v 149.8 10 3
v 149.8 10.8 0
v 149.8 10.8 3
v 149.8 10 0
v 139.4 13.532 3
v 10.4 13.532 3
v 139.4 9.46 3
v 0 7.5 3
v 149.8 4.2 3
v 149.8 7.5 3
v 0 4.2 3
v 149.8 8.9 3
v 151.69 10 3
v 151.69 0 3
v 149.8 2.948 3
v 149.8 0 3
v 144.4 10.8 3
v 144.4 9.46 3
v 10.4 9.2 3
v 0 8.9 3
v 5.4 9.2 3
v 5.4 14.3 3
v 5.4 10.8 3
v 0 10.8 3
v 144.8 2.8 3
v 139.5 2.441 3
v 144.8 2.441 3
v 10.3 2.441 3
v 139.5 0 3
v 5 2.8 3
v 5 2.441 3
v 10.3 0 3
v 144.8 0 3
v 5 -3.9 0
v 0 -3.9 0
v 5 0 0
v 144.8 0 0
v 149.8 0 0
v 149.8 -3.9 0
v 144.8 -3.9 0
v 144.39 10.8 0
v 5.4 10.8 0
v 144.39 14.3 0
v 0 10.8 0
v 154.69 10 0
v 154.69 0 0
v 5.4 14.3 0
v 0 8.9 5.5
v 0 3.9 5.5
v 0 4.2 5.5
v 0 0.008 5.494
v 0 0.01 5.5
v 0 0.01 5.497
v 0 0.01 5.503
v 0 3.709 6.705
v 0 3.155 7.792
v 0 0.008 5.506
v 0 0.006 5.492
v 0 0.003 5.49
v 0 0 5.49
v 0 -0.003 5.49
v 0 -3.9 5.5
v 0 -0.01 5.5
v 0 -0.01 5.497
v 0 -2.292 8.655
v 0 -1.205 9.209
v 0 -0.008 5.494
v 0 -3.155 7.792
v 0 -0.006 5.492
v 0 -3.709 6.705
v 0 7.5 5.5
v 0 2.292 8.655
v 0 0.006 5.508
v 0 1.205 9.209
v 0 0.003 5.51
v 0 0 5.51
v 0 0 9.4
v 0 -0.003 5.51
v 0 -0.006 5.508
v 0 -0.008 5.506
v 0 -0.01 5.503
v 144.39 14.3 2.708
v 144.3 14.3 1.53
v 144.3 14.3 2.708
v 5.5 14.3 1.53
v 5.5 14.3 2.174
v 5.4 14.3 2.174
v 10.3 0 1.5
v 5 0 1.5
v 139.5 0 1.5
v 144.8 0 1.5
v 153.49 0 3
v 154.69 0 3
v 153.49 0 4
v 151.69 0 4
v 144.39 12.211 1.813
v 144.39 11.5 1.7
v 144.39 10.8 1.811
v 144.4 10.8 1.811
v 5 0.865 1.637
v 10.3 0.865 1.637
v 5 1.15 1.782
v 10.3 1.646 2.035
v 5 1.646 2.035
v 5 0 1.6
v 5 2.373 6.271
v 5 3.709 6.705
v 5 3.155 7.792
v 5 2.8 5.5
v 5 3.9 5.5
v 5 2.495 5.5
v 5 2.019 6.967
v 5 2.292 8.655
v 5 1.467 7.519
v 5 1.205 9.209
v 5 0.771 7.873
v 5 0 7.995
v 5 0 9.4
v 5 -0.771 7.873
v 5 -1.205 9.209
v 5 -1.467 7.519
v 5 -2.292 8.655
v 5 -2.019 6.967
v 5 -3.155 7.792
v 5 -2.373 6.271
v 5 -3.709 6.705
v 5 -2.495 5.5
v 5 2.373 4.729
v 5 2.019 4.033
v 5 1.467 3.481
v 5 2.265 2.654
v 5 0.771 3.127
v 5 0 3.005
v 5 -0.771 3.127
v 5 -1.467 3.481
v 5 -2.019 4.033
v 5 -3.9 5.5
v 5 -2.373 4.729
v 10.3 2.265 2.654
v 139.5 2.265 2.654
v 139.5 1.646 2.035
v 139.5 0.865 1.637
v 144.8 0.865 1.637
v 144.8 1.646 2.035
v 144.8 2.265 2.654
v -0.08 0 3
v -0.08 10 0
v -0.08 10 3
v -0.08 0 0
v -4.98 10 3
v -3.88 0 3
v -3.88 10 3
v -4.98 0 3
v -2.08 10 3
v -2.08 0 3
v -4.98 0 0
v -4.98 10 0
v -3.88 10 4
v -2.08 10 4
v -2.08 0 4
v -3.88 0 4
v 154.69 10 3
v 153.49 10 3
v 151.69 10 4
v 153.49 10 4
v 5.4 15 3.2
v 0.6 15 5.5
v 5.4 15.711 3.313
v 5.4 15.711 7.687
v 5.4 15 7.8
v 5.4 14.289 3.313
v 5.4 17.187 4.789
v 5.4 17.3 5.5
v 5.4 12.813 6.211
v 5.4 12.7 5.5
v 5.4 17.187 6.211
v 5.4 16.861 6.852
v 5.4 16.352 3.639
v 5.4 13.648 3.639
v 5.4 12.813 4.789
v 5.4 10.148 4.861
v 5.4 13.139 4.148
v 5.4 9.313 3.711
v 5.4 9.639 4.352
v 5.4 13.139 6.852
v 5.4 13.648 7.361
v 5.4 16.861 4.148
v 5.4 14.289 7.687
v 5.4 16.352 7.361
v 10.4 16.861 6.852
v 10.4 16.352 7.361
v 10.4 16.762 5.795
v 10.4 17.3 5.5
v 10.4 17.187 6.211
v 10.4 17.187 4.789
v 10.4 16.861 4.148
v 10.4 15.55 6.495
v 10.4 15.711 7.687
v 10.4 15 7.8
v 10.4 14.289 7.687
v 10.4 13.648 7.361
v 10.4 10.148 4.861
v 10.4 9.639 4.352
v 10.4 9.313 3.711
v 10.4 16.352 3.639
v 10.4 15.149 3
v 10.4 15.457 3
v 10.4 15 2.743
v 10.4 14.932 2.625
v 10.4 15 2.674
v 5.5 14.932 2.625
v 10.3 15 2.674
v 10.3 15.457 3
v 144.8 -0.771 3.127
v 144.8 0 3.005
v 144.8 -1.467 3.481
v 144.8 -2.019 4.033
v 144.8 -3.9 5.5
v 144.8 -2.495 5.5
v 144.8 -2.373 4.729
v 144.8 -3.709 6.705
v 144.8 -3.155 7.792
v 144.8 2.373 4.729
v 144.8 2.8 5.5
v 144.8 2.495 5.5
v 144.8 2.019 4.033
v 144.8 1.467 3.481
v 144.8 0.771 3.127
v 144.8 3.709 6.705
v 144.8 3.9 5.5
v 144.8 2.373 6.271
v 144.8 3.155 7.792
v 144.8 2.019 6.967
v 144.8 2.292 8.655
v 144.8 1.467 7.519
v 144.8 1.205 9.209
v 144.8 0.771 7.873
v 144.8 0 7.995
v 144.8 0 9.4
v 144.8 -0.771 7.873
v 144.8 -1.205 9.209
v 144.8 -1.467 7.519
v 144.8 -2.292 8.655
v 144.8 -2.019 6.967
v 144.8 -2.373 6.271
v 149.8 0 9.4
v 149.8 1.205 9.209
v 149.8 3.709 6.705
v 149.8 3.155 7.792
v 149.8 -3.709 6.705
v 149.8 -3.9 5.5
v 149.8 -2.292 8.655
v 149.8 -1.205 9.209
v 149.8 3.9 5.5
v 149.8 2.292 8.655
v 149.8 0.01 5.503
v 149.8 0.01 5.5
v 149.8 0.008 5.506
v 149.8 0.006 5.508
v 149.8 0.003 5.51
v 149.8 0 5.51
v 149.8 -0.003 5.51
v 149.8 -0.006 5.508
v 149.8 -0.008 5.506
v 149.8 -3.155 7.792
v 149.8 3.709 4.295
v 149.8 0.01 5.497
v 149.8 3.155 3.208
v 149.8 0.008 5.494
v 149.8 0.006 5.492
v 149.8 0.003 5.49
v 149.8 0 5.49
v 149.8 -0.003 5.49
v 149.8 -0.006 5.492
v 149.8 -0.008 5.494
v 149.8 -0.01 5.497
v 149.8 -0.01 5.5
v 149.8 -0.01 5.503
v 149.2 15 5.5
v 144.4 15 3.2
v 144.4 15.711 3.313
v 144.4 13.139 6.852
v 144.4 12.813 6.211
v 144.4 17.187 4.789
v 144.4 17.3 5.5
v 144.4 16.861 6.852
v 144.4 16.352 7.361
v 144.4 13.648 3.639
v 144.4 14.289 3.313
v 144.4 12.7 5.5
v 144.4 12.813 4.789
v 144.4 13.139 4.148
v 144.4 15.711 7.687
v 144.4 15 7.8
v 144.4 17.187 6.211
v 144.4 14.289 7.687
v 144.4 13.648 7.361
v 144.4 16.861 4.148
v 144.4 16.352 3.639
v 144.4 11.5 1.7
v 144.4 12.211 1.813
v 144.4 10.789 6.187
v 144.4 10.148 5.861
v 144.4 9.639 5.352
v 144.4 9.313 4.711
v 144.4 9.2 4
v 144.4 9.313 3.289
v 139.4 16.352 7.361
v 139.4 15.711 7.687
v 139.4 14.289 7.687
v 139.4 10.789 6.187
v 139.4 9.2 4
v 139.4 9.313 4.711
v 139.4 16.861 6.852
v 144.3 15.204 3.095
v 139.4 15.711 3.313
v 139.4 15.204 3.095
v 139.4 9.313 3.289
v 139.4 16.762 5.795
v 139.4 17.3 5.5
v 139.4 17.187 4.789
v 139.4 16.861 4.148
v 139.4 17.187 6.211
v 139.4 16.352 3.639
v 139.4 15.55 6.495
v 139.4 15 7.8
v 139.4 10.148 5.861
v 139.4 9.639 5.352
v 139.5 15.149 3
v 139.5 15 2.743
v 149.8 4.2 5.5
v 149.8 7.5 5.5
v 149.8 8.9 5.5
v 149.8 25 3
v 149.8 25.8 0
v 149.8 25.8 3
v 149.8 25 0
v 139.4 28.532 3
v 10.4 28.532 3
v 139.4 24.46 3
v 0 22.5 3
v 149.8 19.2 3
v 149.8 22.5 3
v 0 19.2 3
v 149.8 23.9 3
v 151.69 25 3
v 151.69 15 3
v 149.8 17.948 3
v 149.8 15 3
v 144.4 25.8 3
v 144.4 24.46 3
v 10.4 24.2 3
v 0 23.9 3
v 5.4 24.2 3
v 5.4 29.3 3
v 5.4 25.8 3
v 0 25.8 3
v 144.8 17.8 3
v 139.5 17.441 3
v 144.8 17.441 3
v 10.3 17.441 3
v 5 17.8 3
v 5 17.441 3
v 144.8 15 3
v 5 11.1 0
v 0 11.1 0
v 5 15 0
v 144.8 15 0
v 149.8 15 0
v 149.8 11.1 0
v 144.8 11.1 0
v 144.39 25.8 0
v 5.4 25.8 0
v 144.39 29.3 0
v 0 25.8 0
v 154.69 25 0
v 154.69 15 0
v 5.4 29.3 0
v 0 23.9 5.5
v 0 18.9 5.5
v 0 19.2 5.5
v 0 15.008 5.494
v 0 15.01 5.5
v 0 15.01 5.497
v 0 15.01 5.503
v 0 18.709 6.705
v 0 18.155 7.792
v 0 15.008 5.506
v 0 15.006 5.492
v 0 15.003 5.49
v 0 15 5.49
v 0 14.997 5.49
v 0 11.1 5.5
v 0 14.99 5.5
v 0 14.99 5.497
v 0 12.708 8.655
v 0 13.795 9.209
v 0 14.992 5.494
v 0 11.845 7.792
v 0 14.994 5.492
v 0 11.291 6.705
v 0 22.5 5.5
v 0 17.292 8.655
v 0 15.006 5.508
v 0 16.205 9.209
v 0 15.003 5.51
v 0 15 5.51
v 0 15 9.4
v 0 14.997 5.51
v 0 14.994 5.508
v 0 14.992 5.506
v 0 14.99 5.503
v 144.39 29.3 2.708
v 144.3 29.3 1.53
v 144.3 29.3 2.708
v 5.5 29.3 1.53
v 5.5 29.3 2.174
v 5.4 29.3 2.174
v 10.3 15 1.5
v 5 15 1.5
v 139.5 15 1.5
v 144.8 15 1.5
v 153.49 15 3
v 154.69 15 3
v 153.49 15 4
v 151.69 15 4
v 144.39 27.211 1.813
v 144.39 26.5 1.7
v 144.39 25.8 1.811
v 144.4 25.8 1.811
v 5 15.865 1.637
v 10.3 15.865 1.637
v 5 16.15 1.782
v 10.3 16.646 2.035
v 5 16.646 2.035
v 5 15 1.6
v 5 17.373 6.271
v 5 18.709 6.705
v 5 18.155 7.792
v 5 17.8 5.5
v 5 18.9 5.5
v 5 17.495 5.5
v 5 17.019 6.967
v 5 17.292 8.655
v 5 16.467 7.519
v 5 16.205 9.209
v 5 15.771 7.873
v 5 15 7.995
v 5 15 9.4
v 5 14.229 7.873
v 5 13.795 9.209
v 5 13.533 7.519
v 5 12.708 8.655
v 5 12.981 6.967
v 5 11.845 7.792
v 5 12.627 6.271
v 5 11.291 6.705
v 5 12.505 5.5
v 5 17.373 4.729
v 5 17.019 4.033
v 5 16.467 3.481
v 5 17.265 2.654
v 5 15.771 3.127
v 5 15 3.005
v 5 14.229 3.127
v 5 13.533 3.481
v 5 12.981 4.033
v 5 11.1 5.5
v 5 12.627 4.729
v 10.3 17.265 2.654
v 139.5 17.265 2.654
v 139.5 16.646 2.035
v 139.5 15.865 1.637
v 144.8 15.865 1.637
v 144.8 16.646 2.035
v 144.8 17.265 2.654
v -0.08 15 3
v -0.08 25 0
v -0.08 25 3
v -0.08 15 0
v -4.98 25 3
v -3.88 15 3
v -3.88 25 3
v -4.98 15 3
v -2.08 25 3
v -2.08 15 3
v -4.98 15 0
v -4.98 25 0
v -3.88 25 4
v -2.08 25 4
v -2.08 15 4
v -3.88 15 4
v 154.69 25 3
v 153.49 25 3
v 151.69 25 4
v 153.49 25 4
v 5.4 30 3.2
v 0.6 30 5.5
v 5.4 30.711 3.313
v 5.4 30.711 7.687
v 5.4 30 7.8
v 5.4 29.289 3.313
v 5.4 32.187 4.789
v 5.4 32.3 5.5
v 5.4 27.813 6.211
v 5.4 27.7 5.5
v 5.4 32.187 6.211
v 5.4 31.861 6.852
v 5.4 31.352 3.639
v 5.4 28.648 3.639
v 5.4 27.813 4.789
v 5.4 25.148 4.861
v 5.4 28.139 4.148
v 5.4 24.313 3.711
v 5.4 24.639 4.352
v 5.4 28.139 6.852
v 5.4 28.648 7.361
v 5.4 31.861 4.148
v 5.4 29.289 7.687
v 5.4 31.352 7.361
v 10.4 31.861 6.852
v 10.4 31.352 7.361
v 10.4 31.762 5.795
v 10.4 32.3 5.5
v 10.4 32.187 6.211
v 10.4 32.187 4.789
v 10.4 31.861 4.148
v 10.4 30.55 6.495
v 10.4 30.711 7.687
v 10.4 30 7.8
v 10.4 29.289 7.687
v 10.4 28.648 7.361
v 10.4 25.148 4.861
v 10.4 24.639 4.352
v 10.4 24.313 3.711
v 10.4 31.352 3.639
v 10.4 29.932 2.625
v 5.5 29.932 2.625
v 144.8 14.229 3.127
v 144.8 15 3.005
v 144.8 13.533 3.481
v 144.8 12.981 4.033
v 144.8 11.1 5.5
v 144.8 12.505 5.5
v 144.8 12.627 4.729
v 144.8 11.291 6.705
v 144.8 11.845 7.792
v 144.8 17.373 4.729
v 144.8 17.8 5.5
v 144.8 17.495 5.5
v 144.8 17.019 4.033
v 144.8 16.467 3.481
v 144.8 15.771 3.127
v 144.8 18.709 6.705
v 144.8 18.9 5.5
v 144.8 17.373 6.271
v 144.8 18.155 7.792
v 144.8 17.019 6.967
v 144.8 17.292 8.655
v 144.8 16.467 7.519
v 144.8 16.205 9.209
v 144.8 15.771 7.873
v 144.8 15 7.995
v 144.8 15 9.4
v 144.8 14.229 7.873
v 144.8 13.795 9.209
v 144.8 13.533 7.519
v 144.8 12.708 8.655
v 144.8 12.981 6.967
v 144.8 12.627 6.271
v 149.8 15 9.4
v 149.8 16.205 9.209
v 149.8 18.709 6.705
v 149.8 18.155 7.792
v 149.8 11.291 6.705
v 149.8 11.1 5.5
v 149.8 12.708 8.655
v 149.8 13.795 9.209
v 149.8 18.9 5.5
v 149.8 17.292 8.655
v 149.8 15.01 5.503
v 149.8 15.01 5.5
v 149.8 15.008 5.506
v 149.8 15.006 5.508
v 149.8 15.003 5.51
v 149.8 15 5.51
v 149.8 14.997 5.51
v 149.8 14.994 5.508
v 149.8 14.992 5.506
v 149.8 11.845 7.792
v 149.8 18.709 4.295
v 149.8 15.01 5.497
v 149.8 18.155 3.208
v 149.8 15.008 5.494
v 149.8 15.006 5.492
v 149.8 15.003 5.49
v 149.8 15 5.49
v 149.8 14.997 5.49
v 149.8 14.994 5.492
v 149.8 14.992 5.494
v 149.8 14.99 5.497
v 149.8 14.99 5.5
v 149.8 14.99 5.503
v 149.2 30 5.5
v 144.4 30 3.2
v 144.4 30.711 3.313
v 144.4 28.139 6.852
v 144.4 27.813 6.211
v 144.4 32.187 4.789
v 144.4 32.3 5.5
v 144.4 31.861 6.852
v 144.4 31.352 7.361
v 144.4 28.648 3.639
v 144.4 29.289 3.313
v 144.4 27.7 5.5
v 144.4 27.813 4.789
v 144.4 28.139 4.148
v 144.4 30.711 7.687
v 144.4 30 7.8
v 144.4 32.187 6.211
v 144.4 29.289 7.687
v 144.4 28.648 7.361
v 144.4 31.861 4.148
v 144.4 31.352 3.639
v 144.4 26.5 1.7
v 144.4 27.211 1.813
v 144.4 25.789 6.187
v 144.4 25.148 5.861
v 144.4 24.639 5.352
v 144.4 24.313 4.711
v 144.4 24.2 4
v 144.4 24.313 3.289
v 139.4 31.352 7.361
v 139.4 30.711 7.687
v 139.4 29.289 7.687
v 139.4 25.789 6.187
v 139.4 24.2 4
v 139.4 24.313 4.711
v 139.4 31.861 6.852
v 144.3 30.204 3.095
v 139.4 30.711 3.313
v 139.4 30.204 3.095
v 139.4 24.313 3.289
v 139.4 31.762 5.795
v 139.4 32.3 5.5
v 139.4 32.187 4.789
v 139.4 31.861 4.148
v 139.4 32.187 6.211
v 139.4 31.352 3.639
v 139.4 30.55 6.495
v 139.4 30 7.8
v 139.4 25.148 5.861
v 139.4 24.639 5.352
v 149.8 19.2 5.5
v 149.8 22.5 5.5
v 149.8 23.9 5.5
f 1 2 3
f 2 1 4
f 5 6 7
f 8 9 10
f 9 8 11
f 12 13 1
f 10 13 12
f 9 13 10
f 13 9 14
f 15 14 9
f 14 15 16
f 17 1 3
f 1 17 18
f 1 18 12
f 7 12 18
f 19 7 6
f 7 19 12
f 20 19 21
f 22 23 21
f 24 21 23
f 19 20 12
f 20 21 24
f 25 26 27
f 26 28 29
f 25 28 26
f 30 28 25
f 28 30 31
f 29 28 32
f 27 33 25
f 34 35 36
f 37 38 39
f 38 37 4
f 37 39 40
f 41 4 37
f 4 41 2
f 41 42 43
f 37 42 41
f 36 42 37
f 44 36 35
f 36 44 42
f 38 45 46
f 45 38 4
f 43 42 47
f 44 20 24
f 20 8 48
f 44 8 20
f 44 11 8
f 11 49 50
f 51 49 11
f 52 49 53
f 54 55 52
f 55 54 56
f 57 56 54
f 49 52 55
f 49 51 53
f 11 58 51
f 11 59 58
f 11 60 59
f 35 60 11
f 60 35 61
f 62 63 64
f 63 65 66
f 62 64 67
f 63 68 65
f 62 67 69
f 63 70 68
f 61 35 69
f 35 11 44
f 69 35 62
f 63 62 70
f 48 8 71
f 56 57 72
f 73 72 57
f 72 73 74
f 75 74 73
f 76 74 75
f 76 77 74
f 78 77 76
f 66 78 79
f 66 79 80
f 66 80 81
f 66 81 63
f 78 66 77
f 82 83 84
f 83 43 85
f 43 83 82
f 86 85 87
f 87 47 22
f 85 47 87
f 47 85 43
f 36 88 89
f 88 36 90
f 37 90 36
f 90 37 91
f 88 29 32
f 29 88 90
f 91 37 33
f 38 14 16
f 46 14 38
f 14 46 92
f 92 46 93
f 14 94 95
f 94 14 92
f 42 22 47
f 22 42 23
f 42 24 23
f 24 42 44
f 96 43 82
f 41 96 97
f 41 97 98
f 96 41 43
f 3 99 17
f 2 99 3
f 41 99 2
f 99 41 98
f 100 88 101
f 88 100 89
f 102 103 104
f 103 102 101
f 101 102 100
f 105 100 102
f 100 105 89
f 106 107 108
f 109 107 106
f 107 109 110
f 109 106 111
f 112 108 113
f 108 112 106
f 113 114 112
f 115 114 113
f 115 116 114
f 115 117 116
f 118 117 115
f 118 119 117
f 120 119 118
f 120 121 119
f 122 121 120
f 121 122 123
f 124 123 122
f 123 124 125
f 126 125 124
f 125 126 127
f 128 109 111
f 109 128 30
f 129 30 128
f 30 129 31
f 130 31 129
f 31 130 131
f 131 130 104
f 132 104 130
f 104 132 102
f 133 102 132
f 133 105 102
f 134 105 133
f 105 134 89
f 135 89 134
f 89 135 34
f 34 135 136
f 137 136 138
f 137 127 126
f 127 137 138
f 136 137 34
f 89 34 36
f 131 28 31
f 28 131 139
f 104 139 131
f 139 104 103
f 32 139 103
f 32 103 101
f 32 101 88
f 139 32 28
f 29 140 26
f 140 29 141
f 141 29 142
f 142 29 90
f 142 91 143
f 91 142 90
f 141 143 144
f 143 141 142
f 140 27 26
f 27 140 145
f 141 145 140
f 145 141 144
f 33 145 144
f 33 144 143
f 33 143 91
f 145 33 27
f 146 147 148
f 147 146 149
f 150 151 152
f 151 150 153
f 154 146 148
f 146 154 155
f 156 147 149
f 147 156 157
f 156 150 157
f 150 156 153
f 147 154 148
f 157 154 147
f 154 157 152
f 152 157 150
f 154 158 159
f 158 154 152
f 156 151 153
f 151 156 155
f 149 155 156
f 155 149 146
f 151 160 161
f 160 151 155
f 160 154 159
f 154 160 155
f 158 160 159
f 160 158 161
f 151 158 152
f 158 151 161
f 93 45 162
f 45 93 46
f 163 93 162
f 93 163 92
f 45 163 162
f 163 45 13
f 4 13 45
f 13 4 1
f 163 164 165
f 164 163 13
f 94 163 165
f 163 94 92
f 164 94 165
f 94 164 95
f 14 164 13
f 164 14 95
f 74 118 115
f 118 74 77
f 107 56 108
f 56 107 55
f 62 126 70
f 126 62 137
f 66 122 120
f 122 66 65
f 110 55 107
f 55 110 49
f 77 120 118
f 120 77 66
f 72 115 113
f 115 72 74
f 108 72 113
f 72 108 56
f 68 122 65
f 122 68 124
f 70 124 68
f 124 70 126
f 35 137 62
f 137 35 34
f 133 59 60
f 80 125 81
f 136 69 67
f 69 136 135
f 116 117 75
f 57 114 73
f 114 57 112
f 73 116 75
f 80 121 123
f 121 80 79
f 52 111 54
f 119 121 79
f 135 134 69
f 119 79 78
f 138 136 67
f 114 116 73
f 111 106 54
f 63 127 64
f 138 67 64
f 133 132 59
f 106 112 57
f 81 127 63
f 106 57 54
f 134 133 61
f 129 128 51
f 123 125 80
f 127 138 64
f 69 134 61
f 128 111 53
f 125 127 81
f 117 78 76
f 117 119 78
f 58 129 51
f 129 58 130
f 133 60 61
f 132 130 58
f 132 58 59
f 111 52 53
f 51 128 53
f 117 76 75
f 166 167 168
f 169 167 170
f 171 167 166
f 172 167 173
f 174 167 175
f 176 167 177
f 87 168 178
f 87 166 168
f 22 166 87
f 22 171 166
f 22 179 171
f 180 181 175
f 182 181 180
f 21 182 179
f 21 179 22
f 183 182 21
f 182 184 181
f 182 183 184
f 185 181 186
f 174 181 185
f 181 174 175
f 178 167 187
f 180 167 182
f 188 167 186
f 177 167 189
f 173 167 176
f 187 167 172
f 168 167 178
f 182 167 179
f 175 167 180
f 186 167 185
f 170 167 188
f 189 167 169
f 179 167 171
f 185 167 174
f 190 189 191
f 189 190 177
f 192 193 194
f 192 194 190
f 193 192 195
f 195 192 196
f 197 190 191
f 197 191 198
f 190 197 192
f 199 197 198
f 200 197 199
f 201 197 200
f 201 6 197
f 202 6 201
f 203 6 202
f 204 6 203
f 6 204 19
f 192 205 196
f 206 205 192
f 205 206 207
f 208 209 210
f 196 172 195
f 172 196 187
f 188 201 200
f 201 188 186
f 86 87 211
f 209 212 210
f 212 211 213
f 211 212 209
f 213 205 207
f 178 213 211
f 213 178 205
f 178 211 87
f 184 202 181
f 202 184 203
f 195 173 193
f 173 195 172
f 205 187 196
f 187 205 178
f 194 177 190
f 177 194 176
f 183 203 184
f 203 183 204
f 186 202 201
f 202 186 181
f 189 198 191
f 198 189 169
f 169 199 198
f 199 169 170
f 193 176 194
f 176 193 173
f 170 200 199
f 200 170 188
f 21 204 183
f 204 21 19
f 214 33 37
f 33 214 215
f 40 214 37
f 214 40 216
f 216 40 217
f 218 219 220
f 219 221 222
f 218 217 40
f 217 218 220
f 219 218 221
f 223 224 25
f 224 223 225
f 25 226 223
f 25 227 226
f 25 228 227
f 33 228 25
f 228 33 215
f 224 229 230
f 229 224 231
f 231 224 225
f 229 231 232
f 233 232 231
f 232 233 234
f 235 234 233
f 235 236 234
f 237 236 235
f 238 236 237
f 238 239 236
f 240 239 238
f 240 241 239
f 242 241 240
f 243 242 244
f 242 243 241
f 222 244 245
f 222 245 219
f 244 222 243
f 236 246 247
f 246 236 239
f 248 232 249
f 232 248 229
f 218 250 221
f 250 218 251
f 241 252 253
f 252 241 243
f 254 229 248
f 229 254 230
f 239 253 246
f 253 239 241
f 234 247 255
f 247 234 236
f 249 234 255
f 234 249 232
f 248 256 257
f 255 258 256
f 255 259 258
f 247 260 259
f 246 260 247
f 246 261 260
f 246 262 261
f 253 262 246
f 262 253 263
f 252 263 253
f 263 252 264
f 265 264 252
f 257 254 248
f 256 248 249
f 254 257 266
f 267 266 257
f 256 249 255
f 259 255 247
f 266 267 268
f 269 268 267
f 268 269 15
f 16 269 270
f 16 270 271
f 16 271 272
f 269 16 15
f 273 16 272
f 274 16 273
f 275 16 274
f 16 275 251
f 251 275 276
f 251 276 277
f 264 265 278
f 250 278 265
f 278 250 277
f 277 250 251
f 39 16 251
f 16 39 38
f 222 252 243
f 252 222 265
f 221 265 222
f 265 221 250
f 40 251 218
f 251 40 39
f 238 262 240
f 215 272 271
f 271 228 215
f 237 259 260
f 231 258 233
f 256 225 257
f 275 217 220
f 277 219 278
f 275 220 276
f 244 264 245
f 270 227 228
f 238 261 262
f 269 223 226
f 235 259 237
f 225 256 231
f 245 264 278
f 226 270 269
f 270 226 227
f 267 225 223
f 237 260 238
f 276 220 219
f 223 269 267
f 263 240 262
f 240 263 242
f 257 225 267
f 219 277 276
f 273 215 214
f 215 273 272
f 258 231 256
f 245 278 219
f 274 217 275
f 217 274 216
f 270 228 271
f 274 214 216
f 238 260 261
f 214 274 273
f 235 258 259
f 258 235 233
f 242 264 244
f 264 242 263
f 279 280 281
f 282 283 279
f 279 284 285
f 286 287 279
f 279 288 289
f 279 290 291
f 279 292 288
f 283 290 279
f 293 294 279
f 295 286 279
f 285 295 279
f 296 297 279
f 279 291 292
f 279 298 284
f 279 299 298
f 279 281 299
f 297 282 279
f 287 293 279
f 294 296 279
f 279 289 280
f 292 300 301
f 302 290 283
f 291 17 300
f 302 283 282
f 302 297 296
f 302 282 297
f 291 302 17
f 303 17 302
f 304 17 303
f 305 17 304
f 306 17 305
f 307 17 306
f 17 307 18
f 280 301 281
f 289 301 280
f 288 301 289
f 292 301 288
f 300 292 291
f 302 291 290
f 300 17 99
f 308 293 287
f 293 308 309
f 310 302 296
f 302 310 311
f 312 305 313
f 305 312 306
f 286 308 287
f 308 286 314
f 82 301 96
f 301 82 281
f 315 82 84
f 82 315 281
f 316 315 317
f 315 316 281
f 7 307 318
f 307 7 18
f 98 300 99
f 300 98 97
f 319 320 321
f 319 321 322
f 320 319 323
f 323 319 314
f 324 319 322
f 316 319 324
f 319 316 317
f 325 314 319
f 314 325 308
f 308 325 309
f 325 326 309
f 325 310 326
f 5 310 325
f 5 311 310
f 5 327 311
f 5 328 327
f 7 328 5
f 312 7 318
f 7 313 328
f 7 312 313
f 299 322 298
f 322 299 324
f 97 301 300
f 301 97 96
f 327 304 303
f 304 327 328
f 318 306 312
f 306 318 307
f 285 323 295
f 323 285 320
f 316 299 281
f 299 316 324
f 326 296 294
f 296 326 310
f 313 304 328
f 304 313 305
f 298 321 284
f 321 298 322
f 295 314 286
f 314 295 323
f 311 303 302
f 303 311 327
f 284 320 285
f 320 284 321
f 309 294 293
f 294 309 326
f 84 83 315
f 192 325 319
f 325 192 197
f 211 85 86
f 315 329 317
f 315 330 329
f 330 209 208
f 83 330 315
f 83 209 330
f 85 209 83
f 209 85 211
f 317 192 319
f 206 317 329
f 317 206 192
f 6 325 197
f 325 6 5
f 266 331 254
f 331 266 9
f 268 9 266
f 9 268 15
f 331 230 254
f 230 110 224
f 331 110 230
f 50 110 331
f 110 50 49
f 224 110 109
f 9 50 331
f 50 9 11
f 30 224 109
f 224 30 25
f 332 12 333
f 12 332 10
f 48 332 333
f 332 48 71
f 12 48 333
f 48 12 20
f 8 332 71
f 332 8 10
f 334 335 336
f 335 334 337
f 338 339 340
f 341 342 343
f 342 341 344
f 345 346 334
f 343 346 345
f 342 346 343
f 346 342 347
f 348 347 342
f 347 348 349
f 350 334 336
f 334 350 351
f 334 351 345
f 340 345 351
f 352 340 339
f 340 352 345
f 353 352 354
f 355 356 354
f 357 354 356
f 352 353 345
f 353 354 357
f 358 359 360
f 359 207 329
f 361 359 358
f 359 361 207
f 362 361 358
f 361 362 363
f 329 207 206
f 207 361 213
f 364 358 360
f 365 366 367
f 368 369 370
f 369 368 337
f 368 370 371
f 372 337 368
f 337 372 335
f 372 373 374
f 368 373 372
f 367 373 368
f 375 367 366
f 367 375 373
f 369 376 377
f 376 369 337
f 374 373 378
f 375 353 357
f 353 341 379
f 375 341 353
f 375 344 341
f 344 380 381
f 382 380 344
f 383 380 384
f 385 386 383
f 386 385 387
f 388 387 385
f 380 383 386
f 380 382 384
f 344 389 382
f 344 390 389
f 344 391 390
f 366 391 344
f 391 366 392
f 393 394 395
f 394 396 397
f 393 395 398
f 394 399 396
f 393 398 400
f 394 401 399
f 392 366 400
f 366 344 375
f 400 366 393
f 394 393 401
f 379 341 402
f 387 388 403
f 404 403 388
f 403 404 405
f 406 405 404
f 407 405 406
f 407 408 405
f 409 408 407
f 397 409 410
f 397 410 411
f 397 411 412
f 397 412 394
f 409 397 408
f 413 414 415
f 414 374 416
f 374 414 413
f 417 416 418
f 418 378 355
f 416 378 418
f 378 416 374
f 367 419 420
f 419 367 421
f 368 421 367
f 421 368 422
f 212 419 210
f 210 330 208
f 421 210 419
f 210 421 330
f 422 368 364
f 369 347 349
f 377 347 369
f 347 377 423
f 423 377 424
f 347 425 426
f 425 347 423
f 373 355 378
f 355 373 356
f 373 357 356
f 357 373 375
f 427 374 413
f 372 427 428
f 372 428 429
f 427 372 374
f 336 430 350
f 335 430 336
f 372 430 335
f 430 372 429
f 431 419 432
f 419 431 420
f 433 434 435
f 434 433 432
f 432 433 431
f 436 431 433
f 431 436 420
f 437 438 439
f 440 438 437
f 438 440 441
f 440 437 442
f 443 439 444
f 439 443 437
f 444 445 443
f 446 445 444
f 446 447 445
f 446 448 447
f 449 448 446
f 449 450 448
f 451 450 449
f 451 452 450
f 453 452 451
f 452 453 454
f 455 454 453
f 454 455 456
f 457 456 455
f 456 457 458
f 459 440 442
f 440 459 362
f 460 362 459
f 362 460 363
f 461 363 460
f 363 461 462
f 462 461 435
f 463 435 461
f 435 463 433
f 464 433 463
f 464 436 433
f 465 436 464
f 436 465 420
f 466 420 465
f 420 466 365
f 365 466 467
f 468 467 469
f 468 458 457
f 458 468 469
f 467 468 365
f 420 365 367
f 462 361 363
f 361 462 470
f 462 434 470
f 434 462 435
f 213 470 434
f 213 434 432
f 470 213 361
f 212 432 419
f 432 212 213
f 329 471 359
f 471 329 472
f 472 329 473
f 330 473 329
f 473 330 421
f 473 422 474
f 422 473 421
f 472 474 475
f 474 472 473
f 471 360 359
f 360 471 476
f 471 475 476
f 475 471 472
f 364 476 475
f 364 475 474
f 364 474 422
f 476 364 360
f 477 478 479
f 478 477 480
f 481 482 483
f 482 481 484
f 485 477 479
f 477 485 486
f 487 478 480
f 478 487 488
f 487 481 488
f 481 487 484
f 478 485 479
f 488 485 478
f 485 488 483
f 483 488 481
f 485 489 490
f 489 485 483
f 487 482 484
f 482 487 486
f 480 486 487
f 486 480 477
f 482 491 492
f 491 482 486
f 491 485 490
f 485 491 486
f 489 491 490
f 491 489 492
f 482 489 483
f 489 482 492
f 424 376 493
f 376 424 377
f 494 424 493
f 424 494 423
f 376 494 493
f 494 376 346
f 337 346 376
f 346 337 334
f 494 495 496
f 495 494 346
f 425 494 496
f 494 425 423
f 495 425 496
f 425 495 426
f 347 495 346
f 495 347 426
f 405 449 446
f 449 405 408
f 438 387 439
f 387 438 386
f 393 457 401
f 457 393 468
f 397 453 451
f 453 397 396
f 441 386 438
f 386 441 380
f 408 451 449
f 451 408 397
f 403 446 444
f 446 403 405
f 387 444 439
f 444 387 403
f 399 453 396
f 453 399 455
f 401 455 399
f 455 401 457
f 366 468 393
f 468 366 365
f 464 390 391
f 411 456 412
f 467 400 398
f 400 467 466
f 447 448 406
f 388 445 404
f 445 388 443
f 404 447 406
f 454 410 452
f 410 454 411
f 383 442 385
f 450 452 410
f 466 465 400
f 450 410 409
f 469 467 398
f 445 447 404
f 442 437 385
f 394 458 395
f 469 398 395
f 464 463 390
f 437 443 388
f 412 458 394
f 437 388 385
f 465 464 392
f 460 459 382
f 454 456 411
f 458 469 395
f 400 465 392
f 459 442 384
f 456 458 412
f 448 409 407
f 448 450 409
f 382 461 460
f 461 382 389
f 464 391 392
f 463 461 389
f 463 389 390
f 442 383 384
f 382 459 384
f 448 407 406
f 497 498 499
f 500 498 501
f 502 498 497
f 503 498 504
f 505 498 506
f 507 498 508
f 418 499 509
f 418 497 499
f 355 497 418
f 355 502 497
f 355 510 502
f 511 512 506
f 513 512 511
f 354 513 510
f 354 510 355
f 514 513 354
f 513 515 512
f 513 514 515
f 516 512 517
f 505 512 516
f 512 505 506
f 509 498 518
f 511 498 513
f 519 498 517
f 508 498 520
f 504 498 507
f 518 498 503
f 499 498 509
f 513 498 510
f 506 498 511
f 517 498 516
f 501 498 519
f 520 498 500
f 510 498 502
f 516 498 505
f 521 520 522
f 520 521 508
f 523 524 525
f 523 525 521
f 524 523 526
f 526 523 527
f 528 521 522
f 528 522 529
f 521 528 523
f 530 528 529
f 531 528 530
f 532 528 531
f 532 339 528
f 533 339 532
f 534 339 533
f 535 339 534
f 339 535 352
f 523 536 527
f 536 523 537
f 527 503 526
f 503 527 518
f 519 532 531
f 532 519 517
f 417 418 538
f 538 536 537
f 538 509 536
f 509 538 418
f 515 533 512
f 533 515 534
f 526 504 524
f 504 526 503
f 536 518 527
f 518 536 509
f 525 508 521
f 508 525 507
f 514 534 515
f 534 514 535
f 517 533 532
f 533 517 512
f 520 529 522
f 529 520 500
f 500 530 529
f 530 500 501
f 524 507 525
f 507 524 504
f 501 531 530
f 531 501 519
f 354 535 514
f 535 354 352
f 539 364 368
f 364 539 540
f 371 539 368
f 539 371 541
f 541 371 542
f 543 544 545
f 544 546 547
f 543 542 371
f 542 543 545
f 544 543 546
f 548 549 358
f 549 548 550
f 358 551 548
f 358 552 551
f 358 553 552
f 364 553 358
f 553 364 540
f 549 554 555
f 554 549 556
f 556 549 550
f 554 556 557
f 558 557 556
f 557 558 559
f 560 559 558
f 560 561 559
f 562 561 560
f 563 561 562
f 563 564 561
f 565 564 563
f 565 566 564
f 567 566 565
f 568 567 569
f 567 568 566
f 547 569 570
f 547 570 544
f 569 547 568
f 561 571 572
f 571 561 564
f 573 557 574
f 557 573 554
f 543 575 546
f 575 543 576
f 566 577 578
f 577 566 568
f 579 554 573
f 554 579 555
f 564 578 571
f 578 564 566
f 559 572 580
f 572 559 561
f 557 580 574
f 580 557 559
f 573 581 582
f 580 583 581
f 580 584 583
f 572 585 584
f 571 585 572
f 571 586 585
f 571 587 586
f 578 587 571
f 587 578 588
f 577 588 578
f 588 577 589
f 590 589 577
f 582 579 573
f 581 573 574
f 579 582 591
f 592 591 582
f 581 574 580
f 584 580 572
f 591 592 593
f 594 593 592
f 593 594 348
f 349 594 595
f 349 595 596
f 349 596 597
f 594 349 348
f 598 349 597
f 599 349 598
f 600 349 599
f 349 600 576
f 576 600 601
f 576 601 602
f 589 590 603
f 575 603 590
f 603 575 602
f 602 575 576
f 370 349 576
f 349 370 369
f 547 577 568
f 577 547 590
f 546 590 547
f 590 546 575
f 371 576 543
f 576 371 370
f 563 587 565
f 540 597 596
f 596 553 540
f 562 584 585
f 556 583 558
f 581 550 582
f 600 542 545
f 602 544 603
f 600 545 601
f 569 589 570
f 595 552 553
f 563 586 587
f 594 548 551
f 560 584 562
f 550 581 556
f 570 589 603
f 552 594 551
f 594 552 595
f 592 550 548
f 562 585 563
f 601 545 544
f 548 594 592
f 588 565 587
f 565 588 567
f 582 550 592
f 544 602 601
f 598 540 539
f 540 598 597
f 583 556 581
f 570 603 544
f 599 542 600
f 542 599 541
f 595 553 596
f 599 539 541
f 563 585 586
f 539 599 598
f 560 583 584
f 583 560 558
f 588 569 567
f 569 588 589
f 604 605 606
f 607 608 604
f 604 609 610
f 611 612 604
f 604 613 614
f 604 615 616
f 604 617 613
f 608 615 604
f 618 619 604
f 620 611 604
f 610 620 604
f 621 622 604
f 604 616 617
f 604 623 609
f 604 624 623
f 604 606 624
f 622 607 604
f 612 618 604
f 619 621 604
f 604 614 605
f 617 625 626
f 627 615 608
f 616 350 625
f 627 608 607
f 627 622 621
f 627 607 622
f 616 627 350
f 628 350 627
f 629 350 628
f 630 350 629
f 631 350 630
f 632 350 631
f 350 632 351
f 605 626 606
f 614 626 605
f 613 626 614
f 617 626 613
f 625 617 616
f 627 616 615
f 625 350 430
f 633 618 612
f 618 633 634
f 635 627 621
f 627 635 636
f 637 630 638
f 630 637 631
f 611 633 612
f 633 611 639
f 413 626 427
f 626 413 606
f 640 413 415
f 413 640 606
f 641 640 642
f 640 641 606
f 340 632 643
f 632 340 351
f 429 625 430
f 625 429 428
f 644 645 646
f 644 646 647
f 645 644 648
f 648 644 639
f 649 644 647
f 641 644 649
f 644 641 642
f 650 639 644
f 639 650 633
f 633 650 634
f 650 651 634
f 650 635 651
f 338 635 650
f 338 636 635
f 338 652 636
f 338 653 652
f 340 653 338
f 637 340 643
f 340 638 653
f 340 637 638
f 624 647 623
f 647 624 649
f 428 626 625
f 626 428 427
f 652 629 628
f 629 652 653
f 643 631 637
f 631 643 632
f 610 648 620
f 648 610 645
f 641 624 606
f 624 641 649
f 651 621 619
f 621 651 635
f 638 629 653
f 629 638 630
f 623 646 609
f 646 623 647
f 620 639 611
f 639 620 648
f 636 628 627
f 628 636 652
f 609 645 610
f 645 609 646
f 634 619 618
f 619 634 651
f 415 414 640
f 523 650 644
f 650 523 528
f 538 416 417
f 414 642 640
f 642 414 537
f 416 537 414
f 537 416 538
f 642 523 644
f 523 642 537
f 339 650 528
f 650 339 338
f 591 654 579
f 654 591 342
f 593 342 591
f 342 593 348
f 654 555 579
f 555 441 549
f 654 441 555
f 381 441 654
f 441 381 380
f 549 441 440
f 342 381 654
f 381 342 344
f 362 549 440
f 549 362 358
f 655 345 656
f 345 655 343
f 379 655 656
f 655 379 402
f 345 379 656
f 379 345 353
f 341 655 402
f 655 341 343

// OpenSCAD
width = 149.8; //159;
tab_depth = 5;
tab_width = 10;
// 5mm to the edge of the tract, the guide bar is 3mm (+/- 1mm on either side)
tab_dim = 3;
height = 100;
thick = 3;
slat_height = 15;
hinge_thick = 5;
hinge_shell_thick = 1.4;
hinge_clearance = 0.2;

type = "door2";

if(type=="door"){
  for(i=[0:height/slat_height-1])
      translate([0, slat_height*(i-1), 0]) liston(width, slat_height);  
}
if(type=="door1"){
  liston(width, slat_height);
}
if(type=="door2"){
  liston(width, slat_height);
  translate([0, slat_height, 0]) liston(width, slat_height);
}


// LISTON: Draws a piece of roller door
module liston(longitud, height=10){
  ht = hinge_thick / 2;
  z = thick + ht;
  
  difference(){
    // Slat body
    cube([longitud, height-0.7, thick]);
    
    // cut-out to accomodate outter hinge
    translate([-0.01, height-hinge_thick+hinge_shell_thick-0.6, -0.01])
      cube([hinge_thick+0.41, hinge_thick/2+hinge_shell_thick+0.6, thick+1]);
    translate([longitud-hinge_thick-0.41, height-hinge_thick+hinge_shell_thick-0.6, -0.01])
      cube([hinge_thick+.51, hinge_thick/2+hinge_shell_thick+0.6, thick+1]);
    
    // cut-out to accomodate inner hinge
    translate([hinge_thick, 0, ht+thick-1.2])
      rotate([0, 90, 0]) 
        cylinder(r=hinge_thick/2+0.3, h=hinge_thick+0.3, $fn=20);
    translate([longitud-hinge_thick*2-0.3, 0, ht+thick-1.2])
      rotate([0, 90, 0])
        cylinder(r=hinge_thick/2+0.3, h=hinge_thick+0.3, $fn=20);
  }
  
  difference(){
    union(){
      // horizontal ribs
      //translate([5, height-1.7, 0]) cube([longitud-10, 1, z]);
      translate([hinge_thick+0.5, height-3.2, 0]) 
        rotate([-30, 0, 0])
          cube([longitud-hinge_thick*2-1, hinge_shell_thick, z+2]);
      translate([0, hinge_shell_thick*2, 0]) 
        cube([longitud, hinge_shell_thick, z]);
      translate([0, slat_height/2, 0]) cube([longitud, hinge_shell_thick, z]);
      
      // Slot Guides
      translate([-tab_depth+0.02, 0, 0]){
        cube([tab_depth-0.1, tab_width, thick]);
        translate([1.1, 0, thick])
          cube([1.8, tab_width, 1]); 
      }
      translate([longitud-0.01, 0, 0]){
        cube([tab_depth-0.1, tab_width, thick]);
        translate([1.9, 0, thick])
          cube([1.8, tab_width, 1]); 
      }
      
      // left side
      translate([0, 0, z]){
        rotate([0, 90, 0]){
          difference(){
            union(){
              cylinder(r1=ht+hinge_shell_thick, r2=ht+hinge_shell_thick, h=hinge_thick, $fn=20);
              translate([0, -ht-hinge_shell_thick, 0]) 
                cube([thick + ht, ht+hinge_shell_thick, hinge_thick]);
            }
            cylinder(r1=0.01, r2=ht, h=hinge_thick+0.01, $fn=20);
          }
          translate([0, height, 0.4]){
            translate([0, 0, hinge_clearance])
              cylinder(r1=0, r2=ht-hinge_clearance, h=hinge_thick-hinge_clearance, $fn=20);
            translate([0, 0, hinge_thick]){
              hull(){
                cylinder(r1=ht-hinge_clearance, r2=ht-hinge_clearance, h=hinge_thick, $fn=20);
                translate([ht, -3.5, 0])
                  cylinder(r1=ht-hinge_clearance, r2=ht-hinge_clearance, h=hinge_thick, $fn=20);
              }
            }
          }
        }
      }
      
      // right side
      translate([longitud-hinge_thick, 0, z]){
        rotate([0, 90, 0]){
          difference(){
            union(){
              cylinder(r1=ht+hinge_shell_thick, r2=ht+hinge_shell_thick, h=hinge_thick, $fn=20);
              translate([0, -ht-hinge_shell_thick, 0]) 
                cube([thick + ht, ht+hinge_shell_thick, hinge_thick]);
            }
            translate([0, 0, -0.01]) 
              cylinder(r1=ht, r2=0.01, h=hinge_thick+0.01, $fn=20);
          }
          translate([0, height, -0.4]){
            cylinder(r1=ht-hinge_clearance, r2=0, h=hinge_thick-0.2, $fn=20);
            translate([0, 0, -hinge_thick]){
              hull(){
                cylinder(r1=ht-hinge_clearance, r2=ht-hinge_clearance, h=hinge_thick, $fn=20);
                translate([1.5, -3.5, 0])
                  cylinder(r1=ht-hinge_clearance, r2=ht-hinge_clearance, h=hinge_thick, $fn=20);
              }
            }
          }
        }
      }
    }
    // Clean up the bottom
    translate([0, 0, -10]) cube([longitud, height, 10]);
  }    
}
